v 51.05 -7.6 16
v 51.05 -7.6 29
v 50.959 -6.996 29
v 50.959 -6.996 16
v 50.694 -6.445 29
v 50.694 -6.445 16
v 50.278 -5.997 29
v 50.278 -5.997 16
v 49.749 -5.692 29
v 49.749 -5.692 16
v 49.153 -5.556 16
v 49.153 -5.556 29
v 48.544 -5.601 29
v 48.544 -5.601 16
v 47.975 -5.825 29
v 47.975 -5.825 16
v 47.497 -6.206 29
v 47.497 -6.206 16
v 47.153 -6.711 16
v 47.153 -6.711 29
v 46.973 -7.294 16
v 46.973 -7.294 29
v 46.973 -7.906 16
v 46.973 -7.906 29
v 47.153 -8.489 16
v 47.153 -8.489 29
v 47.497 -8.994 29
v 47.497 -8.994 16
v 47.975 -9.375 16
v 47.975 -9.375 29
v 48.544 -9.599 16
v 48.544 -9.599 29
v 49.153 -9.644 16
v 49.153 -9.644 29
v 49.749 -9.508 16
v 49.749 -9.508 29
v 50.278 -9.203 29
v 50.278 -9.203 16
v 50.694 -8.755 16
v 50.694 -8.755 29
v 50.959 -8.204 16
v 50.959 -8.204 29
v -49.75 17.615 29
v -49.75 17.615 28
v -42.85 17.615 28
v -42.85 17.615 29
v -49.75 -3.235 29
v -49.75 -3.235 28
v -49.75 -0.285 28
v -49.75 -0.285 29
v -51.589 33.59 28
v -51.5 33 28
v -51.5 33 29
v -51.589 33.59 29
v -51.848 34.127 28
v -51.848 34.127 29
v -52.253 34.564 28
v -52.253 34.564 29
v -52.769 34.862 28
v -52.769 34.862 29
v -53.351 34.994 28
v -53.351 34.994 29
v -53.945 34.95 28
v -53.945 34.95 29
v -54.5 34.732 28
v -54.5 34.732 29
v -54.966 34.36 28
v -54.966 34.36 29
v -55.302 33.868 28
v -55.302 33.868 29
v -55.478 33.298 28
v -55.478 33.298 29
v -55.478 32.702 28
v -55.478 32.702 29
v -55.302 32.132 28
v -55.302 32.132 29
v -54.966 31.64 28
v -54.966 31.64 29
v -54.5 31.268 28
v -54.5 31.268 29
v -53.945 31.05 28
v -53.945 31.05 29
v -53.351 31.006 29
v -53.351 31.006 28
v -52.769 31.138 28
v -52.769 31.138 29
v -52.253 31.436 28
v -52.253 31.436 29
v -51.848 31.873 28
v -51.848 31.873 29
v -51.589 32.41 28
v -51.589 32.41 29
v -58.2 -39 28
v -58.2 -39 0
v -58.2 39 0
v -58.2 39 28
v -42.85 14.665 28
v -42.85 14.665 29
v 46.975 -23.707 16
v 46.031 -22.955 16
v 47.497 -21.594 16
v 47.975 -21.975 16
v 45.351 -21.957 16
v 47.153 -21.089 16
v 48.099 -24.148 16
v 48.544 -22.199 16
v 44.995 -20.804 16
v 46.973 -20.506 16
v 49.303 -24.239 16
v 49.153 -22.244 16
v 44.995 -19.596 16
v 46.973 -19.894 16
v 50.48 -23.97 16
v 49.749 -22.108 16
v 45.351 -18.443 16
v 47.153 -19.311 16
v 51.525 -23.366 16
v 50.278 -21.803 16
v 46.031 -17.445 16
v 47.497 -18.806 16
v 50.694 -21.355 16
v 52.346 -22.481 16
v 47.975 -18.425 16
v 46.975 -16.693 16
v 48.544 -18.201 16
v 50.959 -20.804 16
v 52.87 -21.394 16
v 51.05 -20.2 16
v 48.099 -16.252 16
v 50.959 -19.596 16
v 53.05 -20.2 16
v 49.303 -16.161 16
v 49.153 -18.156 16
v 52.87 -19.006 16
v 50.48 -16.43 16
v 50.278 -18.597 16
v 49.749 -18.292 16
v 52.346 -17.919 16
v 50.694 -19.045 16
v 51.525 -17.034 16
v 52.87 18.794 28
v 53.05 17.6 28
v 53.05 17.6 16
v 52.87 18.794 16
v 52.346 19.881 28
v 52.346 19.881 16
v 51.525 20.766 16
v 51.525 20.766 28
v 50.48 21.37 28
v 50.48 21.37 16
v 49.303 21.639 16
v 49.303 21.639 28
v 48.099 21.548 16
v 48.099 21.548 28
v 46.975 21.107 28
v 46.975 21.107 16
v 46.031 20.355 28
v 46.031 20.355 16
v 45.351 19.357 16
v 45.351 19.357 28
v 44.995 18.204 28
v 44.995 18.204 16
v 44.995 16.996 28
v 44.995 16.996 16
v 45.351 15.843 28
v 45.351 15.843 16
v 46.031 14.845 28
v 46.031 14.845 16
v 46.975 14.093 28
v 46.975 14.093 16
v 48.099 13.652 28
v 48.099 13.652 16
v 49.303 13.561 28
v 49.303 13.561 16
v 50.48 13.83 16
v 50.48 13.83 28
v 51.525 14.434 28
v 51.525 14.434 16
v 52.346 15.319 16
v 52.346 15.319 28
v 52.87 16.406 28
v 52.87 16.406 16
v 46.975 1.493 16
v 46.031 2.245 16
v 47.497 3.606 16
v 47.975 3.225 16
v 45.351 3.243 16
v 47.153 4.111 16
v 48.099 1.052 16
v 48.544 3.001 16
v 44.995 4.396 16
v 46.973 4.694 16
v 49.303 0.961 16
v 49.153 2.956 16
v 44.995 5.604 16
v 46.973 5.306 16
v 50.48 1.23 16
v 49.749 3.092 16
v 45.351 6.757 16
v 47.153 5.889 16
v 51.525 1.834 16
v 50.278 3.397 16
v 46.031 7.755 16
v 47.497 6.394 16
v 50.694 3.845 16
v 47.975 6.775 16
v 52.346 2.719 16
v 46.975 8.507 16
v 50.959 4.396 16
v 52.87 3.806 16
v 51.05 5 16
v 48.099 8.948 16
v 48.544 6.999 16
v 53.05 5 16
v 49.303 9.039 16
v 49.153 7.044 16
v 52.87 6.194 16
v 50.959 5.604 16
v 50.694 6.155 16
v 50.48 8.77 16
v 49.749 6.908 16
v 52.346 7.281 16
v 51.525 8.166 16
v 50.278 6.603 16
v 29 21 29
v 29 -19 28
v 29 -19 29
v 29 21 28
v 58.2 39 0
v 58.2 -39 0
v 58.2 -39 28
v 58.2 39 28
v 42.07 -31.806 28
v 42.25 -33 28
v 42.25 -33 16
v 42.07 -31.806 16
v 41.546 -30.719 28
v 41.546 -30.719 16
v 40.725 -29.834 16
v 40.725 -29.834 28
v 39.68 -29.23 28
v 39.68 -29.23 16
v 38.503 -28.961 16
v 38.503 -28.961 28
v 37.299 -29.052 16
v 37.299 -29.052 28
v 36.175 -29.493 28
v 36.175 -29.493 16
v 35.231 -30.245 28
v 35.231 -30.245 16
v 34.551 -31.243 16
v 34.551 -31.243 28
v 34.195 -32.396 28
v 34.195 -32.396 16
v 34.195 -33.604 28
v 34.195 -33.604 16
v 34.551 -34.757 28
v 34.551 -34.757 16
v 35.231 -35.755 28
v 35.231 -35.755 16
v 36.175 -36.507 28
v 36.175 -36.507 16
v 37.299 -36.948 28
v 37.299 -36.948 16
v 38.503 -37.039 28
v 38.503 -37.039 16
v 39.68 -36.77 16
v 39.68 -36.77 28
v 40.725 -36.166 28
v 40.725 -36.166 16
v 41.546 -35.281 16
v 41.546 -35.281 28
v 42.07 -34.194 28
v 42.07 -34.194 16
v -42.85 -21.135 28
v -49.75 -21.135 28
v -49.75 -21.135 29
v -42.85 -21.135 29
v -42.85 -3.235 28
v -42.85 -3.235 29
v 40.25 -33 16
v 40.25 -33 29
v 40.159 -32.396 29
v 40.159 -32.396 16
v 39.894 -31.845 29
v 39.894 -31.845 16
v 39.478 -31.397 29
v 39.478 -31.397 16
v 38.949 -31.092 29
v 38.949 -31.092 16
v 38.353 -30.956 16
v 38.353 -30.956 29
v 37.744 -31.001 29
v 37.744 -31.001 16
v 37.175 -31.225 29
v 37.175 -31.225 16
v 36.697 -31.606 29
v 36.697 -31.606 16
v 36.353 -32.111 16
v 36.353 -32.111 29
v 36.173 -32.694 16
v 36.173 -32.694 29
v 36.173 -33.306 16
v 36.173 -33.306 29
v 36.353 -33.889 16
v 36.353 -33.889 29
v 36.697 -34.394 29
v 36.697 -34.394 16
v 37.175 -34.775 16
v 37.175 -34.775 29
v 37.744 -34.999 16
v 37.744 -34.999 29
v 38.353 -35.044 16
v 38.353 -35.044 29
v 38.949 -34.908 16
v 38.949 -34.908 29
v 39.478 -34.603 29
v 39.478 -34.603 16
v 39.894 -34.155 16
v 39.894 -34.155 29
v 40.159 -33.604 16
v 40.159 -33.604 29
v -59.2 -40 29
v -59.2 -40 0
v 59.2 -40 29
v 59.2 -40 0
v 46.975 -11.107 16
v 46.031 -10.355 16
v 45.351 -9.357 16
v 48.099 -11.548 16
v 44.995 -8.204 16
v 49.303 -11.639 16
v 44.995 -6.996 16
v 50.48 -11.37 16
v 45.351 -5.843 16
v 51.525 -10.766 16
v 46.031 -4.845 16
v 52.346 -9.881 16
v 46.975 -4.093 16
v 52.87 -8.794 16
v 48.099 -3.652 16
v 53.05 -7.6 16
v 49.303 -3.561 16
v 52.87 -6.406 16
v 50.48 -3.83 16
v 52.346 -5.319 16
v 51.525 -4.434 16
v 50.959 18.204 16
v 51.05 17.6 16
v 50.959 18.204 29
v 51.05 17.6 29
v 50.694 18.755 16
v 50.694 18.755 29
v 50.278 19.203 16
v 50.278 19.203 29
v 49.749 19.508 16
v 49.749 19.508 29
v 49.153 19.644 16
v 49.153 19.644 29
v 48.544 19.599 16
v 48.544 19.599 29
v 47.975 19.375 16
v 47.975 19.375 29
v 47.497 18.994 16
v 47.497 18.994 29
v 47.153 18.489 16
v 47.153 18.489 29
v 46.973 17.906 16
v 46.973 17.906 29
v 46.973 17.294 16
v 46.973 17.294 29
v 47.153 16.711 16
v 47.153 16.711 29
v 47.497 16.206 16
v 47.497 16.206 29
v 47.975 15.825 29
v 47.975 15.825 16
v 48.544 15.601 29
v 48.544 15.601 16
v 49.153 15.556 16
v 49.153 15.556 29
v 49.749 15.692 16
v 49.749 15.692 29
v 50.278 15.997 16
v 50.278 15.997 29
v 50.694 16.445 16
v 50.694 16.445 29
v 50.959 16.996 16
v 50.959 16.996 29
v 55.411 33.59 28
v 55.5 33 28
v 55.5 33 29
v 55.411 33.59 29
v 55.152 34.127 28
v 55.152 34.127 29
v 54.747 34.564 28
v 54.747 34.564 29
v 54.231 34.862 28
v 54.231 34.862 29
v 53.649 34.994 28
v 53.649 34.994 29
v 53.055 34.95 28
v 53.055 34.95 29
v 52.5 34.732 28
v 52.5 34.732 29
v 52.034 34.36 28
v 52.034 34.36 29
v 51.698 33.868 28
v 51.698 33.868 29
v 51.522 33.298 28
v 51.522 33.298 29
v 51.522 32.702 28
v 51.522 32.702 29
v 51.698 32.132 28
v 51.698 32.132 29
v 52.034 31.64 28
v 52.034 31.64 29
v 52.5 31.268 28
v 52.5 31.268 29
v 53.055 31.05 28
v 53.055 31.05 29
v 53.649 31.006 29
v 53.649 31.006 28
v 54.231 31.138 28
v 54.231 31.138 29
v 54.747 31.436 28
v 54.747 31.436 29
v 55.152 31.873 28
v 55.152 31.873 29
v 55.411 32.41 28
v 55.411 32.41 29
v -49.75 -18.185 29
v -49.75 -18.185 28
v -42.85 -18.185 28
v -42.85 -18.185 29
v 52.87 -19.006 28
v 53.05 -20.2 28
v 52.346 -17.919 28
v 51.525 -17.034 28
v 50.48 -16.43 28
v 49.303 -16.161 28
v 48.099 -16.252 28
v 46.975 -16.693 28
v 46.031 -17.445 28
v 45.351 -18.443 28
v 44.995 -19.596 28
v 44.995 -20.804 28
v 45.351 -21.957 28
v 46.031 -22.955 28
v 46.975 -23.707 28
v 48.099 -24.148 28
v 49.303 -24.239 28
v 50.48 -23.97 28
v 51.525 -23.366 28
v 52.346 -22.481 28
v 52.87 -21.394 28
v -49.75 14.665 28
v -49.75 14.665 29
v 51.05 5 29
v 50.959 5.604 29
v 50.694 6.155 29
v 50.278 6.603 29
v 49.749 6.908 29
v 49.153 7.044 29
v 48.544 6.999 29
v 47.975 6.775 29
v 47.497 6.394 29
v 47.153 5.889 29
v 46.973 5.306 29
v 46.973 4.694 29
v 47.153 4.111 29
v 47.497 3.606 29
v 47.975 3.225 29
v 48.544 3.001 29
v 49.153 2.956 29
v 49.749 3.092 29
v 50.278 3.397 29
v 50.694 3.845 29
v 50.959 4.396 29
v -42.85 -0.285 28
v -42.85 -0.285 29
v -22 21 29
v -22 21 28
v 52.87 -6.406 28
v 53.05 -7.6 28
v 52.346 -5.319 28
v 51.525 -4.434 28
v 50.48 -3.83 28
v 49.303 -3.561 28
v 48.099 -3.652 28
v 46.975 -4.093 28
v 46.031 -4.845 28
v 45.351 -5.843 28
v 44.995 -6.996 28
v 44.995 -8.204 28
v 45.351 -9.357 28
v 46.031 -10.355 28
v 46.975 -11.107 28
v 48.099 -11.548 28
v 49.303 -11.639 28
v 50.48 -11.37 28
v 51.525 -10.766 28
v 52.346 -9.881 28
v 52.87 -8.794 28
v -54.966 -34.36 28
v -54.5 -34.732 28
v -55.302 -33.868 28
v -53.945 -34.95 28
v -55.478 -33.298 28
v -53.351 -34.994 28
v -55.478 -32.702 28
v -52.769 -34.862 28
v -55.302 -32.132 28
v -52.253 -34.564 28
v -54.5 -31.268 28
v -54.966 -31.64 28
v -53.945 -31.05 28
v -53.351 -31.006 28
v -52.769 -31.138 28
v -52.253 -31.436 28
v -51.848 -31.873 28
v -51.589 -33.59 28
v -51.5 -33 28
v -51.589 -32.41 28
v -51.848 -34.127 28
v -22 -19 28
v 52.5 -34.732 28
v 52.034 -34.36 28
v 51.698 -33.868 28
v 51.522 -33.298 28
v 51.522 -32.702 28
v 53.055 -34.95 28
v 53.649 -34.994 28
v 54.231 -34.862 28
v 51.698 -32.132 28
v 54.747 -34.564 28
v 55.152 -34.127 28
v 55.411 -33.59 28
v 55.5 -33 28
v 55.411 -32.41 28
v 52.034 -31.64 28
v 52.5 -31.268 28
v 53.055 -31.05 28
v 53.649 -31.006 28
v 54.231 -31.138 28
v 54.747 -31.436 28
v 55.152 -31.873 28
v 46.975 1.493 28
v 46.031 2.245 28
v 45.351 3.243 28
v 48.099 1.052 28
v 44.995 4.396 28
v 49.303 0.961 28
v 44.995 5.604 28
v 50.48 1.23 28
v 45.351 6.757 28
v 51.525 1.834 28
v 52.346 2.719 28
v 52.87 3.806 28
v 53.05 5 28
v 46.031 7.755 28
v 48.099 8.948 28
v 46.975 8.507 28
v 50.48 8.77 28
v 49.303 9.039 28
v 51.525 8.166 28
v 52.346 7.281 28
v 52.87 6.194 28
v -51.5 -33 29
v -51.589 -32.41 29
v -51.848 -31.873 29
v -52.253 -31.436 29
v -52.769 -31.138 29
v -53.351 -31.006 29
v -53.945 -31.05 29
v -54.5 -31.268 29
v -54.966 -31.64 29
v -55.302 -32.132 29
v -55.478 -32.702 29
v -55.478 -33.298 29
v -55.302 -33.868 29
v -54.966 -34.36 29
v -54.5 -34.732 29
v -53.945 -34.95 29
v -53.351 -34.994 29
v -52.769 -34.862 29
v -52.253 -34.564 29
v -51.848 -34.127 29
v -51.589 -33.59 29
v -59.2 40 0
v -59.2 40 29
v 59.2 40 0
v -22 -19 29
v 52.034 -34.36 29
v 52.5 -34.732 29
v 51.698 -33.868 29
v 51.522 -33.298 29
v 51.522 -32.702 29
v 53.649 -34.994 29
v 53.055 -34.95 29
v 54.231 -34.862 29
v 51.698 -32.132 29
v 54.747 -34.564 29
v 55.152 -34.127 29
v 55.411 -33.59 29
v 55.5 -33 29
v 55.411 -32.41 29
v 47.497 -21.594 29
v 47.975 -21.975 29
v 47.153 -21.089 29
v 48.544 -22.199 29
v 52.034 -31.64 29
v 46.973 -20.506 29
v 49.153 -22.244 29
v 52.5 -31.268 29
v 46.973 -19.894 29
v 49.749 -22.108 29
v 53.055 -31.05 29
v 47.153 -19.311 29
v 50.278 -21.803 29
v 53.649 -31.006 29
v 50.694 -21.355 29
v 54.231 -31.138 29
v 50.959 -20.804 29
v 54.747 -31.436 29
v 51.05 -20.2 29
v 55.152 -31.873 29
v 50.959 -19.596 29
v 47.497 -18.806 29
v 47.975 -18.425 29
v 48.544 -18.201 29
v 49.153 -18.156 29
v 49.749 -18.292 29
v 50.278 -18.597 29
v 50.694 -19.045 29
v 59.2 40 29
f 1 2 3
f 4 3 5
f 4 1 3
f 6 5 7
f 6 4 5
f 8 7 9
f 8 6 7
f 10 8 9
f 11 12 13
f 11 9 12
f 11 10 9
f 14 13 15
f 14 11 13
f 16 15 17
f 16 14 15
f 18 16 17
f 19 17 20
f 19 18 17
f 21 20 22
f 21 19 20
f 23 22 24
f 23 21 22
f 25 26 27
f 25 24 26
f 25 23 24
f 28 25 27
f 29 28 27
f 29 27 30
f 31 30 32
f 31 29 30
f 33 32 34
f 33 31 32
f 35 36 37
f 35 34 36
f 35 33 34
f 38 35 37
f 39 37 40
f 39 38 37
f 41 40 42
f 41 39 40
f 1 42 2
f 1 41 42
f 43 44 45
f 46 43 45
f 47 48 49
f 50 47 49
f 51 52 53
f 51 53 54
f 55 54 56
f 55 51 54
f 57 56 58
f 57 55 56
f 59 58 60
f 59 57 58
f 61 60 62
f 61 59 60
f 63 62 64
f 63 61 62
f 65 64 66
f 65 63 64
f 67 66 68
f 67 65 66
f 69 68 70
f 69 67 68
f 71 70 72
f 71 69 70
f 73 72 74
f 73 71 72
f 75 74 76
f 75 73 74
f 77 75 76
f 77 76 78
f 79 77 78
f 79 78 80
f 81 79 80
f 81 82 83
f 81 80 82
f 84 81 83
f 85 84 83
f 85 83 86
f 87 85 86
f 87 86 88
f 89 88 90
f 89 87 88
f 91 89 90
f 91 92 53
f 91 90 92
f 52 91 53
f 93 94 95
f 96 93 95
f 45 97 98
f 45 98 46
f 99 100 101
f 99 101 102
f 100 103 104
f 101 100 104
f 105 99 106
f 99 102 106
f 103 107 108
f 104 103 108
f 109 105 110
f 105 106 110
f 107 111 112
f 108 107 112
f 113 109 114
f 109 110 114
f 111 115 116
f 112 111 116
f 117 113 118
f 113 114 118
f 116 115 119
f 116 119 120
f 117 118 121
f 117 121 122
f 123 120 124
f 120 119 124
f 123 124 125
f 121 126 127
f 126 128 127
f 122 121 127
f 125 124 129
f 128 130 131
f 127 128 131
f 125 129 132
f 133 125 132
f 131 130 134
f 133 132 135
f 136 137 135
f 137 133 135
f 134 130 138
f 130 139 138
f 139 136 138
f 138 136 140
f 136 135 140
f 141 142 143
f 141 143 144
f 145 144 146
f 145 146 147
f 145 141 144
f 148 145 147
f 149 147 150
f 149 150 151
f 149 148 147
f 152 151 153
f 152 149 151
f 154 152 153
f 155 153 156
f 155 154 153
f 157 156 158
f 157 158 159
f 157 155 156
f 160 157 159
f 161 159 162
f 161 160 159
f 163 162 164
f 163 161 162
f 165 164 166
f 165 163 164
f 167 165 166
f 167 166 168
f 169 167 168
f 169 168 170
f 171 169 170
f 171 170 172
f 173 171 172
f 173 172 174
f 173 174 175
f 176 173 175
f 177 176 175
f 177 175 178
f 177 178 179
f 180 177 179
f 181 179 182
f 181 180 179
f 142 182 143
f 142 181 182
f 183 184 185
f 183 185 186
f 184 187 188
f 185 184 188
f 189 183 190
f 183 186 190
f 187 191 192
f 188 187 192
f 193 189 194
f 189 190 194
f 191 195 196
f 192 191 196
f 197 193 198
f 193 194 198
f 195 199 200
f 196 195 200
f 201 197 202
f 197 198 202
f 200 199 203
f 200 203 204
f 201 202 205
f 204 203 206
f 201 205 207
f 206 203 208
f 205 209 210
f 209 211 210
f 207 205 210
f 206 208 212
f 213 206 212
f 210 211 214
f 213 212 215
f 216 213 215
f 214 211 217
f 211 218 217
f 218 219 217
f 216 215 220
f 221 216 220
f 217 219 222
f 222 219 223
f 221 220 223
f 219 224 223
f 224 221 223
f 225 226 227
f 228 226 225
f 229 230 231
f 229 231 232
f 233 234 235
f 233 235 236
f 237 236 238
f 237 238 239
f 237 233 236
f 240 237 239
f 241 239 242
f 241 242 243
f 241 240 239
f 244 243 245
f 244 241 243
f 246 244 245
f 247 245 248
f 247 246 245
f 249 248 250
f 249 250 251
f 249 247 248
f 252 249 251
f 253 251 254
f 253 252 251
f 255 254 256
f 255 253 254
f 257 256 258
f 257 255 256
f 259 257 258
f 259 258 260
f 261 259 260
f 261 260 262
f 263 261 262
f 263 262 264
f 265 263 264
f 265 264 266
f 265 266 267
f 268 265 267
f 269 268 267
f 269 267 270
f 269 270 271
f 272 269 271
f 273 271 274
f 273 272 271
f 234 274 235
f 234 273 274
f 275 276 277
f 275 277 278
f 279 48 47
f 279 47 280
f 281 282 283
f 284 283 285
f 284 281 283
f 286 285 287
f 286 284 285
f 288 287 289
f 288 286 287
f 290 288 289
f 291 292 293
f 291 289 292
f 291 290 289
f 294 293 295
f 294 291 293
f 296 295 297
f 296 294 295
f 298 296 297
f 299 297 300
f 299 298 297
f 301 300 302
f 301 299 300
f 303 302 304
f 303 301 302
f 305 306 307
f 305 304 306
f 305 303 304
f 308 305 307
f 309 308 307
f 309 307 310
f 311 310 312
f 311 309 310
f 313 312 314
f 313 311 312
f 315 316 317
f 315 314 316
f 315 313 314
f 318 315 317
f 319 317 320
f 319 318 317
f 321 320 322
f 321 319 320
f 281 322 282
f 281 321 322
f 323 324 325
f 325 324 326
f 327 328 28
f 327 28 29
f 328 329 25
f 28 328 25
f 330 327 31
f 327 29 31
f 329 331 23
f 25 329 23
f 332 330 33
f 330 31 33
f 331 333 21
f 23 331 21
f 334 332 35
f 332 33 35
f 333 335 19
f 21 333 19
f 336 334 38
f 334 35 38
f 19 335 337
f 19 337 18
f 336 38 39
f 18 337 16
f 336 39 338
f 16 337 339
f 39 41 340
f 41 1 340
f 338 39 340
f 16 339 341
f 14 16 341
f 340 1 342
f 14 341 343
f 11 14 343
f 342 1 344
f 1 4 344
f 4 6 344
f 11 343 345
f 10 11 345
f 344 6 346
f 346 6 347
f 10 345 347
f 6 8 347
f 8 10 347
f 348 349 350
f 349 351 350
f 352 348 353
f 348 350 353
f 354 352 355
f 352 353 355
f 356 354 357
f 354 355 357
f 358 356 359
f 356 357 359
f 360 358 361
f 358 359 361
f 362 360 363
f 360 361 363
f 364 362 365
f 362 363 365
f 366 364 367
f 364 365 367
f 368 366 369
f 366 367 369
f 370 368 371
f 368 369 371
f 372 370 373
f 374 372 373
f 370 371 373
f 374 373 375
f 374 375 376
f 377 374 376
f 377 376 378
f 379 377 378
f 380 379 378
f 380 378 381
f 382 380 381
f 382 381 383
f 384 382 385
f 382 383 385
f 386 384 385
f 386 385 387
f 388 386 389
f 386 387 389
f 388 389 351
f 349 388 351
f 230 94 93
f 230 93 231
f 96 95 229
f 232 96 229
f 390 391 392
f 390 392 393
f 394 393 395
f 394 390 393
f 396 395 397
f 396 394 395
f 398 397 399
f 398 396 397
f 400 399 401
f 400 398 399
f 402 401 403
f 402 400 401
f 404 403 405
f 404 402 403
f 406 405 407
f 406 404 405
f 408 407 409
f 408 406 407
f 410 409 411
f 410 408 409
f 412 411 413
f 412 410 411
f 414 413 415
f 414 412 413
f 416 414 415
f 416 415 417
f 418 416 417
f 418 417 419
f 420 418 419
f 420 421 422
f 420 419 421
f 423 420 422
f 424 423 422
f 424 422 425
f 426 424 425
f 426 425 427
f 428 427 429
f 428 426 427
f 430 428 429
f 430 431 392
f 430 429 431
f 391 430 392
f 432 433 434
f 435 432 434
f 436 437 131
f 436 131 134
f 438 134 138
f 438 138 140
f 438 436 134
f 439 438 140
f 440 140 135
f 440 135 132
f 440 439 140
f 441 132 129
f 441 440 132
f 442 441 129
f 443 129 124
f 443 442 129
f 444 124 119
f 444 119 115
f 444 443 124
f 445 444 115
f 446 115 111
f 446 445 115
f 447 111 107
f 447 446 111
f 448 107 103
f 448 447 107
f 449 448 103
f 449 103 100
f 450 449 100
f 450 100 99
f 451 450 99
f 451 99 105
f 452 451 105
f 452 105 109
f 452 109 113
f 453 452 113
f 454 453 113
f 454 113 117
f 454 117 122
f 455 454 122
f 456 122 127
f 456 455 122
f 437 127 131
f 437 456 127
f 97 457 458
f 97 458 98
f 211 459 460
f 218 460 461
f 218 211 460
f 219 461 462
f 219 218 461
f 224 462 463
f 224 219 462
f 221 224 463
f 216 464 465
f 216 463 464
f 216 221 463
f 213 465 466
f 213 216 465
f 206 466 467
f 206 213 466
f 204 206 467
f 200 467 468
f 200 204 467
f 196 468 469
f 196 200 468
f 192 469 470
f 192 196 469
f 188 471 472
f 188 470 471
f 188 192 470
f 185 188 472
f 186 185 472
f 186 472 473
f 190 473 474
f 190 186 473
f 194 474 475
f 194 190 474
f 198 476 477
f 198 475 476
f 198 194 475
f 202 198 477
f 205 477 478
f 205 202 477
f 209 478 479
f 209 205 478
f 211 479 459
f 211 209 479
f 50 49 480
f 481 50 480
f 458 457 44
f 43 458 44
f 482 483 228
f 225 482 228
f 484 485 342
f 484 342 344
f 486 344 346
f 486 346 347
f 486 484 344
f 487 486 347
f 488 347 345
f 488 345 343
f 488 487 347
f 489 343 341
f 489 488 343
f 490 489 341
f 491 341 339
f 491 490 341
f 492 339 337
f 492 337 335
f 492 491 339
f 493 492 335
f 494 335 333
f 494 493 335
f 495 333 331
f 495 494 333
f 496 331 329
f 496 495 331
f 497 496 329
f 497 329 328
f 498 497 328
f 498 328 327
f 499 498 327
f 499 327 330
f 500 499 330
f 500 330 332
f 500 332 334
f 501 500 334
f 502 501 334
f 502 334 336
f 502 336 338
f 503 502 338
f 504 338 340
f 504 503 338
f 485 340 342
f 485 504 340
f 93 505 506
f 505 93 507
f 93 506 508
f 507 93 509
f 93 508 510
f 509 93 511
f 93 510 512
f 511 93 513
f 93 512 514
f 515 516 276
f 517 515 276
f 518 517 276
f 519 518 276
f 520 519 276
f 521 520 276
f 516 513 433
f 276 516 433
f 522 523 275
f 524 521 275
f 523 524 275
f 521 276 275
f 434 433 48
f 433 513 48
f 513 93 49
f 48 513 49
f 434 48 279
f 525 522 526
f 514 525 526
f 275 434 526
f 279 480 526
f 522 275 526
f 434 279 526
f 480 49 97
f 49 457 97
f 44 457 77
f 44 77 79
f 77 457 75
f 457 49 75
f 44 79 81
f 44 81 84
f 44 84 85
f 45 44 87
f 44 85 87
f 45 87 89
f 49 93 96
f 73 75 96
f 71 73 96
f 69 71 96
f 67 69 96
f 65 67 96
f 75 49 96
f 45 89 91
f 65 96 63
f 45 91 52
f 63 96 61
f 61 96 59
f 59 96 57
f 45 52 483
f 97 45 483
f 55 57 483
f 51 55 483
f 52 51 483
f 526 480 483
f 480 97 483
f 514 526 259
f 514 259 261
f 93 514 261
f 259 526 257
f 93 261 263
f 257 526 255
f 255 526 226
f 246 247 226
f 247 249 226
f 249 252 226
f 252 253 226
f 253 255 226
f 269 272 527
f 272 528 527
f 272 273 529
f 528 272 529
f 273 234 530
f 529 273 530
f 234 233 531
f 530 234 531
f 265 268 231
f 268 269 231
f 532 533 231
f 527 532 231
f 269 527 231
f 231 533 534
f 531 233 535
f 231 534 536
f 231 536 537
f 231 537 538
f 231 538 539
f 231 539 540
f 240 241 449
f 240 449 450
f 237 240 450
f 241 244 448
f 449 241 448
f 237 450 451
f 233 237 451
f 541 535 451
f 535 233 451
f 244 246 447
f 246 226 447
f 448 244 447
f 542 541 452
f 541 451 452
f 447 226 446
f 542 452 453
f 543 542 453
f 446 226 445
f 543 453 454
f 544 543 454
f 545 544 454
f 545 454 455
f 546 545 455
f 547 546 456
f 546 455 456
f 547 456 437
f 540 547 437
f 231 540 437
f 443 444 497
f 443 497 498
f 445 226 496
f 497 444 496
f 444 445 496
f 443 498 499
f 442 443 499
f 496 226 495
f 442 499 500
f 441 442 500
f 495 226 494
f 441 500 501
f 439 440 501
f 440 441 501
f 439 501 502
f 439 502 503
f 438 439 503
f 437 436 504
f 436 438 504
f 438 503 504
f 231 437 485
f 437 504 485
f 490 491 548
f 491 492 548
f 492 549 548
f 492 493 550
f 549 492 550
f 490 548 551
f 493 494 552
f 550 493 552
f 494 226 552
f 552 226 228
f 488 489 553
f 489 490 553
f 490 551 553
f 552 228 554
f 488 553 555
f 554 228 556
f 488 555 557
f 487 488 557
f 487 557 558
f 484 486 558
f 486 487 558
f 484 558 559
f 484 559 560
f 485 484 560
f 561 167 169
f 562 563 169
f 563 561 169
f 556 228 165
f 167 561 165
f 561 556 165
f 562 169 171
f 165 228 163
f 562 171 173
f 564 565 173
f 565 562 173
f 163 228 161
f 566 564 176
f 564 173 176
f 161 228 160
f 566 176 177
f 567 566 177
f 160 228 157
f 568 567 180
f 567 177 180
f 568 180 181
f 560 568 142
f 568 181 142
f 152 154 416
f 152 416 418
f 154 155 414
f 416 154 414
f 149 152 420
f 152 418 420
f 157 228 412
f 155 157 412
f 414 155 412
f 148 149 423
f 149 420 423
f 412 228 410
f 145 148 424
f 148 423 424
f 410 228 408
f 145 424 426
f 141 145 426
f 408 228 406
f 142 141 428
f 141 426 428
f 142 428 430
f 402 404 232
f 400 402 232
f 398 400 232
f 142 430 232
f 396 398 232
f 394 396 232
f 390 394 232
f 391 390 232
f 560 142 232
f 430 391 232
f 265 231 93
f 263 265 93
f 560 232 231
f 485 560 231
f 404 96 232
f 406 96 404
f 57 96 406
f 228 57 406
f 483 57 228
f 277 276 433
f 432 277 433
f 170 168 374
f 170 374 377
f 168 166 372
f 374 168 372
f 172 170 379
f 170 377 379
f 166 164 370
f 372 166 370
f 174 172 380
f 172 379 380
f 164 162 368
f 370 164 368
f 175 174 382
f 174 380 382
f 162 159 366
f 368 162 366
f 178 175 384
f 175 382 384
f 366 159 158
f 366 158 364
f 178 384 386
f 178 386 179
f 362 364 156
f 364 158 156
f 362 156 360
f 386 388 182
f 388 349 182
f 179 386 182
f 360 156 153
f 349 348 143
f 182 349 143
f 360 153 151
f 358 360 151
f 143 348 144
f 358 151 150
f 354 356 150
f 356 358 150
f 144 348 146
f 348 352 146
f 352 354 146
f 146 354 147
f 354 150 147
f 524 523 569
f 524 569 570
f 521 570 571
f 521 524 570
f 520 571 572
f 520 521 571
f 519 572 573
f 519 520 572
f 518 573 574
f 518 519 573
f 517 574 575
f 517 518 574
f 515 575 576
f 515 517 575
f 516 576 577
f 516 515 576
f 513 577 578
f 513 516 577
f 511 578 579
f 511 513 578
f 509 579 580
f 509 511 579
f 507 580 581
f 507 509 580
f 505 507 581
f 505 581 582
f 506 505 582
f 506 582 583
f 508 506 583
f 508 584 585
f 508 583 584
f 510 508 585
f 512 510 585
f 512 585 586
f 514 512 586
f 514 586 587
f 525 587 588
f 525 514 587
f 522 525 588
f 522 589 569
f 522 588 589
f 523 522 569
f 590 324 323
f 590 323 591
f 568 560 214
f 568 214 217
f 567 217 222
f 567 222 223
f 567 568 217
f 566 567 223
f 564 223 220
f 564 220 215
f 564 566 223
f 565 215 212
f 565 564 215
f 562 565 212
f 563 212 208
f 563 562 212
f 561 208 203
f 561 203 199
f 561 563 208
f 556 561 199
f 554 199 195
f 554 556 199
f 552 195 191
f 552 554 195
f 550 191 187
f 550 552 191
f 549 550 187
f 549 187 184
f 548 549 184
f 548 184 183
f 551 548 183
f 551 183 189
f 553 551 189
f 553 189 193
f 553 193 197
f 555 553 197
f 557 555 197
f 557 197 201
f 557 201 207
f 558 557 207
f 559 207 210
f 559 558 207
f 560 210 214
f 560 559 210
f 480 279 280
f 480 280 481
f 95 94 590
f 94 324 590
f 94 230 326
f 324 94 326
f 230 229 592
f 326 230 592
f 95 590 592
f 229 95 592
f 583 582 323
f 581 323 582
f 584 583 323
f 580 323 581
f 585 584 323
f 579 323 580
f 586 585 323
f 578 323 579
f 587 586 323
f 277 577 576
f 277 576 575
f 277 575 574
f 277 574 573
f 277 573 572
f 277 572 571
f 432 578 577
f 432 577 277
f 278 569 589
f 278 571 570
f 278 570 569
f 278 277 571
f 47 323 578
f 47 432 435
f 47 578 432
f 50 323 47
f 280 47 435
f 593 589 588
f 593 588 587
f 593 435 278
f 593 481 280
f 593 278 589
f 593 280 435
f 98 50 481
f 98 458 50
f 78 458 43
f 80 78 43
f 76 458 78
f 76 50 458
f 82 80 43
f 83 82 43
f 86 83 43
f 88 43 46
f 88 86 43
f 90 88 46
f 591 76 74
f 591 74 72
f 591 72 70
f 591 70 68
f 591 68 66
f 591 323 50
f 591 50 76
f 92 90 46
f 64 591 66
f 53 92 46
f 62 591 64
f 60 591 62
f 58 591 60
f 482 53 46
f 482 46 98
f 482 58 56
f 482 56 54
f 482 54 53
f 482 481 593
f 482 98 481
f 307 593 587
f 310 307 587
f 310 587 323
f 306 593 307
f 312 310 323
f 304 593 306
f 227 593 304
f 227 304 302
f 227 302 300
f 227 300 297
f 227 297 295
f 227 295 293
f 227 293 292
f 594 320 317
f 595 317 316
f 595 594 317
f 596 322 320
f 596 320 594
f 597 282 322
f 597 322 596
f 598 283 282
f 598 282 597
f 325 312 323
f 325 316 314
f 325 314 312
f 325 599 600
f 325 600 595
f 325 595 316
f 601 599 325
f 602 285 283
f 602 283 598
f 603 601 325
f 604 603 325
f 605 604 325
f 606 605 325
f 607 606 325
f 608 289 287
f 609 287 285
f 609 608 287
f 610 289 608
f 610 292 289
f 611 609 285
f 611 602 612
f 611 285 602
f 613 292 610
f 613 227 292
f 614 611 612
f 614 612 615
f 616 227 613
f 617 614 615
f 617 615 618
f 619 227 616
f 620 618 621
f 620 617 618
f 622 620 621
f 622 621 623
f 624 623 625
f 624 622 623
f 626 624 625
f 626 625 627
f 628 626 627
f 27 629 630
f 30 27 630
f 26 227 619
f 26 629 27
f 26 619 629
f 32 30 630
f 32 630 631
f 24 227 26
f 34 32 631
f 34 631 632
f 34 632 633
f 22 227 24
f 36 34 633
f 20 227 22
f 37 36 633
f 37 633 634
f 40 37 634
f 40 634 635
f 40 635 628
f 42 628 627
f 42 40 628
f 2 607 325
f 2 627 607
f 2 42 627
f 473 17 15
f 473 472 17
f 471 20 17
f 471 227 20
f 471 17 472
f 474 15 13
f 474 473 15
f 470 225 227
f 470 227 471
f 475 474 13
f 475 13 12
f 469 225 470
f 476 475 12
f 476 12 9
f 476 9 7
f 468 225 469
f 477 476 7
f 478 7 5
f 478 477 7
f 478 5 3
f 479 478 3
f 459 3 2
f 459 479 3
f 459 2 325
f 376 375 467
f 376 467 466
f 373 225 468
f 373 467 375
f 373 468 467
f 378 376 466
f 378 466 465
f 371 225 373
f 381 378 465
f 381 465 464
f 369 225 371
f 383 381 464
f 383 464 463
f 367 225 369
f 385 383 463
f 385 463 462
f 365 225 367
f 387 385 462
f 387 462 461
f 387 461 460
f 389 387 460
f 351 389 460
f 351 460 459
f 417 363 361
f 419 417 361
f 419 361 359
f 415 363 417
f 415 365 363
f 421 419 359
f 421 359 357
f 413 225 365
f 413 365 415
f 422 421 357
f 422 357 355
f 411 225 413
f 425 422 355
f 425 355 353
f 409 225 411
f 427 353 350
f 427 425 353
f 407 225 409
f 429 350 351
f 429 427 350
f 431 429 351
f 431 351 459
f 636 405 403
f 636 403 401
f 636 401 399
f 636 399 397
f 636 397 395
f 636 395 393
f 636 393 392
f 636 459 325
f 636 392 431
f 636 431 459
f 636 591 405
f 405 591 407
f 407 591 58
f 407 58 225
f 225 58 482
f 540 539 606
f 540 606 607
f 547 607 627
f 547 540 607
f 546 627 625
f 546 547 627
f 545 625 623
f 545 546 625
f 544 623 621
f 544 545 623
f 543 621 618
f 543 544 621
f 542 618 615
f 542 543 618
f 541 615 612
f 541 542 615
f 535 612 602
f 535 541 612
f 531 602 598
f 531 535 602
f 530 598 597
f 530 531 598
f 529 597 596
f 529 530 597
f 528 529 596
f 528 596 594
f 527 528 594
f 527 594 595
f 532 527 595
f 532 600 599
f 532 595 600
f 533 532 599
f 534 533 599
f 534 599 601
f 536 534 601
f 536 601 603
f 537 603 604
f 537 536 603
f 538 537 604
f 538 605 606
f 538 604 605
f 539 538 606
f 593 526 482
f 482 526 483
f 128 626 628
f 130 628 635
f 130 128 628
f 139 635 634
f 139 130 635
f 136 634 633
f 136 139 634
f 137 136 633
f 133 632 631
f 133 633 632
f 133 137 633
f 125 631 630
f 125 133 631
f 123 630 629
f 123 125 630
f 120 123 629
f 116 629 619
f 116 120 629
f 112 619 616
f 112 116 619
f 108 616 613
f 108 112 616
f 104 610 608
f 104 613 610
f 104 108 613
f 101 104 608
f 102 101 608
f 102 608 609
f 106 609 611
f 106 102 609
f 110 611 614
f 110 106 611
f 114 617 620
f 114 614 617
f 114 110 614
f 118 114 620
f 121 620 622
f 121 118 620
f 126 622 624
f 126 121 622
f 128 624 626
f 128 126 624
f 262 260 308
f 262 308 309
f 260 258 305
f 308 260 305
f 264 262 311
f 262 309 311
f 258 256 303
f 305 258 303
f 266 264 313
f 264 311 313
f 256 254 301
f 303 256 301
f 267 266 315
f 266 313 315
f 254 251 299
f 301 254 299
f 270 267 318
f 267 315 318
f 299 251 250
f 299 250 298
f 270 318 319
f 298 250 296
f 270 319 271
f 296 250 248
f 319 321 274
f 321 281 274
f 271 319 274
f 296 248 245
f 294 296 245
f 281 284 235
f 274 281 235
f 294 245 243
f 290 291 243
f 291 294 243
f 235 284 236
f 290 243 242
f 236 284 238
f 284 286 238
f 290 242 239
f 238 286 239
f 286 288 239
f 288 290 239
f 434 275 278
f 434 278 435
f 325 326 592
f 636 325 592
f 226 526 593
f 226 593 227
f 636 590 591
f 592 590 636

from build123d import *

# Parameters (mm, degrees)
SKETCH_W        = 118.4
SKETCH_H        = 80
PAD_DEPTH       = 29
THICKNESS_T     = -1
SKETCH001_R     = 2
POCKET_DEPTH    = 29.001
SKETCH002_W     = 51
SKETCH002_H     = 40
POCKET001_DEPTH = 29.001
SKETCH003_R     = 2.05
SKETCH003_W     = 6.9
SKETCH003_H     = 2.95
POCKET002_DEPTH = 29.001
SKETCH004_R     = 4.05
SKETCH004_R_2   = 2.05
PAD001_DEPTH    = 12


with BuildPart() as part:
    # Sketch → Pad (new body)
    with BuildSketch(Plane.XY):
        Rectangle(SKETCH_W, SKETCH_H)
    extrude(amount=PAD_DEPTH)

    # Thickness
    thickness_openings = [part.faces().sort_by_distance(p)[0] for p in [
        (0, 0, 0),
    ]]
    offset(amount=THICKNESS_T, openings=thickness_openings)

    # Sketch001 → Pocket (cut, through all)
    with BuildSketch(Plane.XY):
        with Locations((53.5, 33)):
            Circle(SKETCH001_R)
        with Locations((53.5, -33)):
            Circle(SKETCH001_R)
        with Locations((-53.5, -33)):
            Circle(SKETCH001_R)
        with Locations((-53.5, 33)):
            Circle(SKETCH001_R)
    extrude(amount=POCKET_DEPTH, mode=Mode.SUBTRACT)

    # Sketch002 → Pocket001 (cut, through all)
    with BuildSketch(Plane.XY):
        with Locations((3.5, 1)):
            Rectangle(SKETCH002_W, SKETCH002_H)
    extrude(amount=POCKET001_DEPTH, mode=Mode.SUBTRACT)

    # Sketch003 → Pocket002 (cut, through all)
    with BuildSketch(Plane.XY):
        with Locations((49, 17.6)):
            Circle(SKETCH003_R)
        with Locations((49, 5)):
            Circle(SKETCH003_R)
        with Locations((49, -7.6)):
            Circle(SKETCH003_R)
        with Locations((49, -20.2)):
            Circle(SKETCH003_R)
        with Locations((38.2, -33)):
            Circle(SKETCH003_R)
        with Locations((-46.3, 16.14)):
            Rectangle(SKETCH003_W, SKETCH003_H)
        with Locations((-46.3, -1.76)):
            Rectangle(SKETCH003_W, SKETCH003_H)
        with Locations((-46.3, -19.66)):
            Rectangle(SKETCH003_W, SKETCH003_H)
    extrude(amount=POCKET002_DEPTH, mode=Mode.SUBTRACT)

    # Sketch004 (on DatumPlane) → Pad001 (join)
    with BuildSketch(Plane.XY.offset(28)):
        with Locations((49, 17.6)):
            Circle(SKETCH004_R)
        with Locations((49, 17.6)):
            Circle(SKETCH004_R_2, mode=Mode.SUBTRACT)
        with Locations((49, 5)):
            Circle(SKETCH004_R)
        with Locations((49, 5)):
            Circle(SKETCH004_R_2, mode=Mode.SUBTRACT)
        with Locations((49, -7.6)):
            Circle(SKETCH004_R)
        with Locations((49, -7.6)):
            Circle(SKETCH004_R_2, mode=Mode.SUBTRACT)
        with Locations((49, -20.2)):
            Circle(SKETCH004_R)
        with Locations((49, -20.2)):
            Circle(SKETCH004_R_2, mode=Mode.SUBTRACT)
        with Locations((38.2, -33)):
            Circle(SKETCH004_R)
        with Locations((38.2, -33)):
            Circle(SKETCH004_R_2, mode=Mode.SUBTRACT)
    extrude(amount=-PAD001_DEPTH)


solid = part.part
